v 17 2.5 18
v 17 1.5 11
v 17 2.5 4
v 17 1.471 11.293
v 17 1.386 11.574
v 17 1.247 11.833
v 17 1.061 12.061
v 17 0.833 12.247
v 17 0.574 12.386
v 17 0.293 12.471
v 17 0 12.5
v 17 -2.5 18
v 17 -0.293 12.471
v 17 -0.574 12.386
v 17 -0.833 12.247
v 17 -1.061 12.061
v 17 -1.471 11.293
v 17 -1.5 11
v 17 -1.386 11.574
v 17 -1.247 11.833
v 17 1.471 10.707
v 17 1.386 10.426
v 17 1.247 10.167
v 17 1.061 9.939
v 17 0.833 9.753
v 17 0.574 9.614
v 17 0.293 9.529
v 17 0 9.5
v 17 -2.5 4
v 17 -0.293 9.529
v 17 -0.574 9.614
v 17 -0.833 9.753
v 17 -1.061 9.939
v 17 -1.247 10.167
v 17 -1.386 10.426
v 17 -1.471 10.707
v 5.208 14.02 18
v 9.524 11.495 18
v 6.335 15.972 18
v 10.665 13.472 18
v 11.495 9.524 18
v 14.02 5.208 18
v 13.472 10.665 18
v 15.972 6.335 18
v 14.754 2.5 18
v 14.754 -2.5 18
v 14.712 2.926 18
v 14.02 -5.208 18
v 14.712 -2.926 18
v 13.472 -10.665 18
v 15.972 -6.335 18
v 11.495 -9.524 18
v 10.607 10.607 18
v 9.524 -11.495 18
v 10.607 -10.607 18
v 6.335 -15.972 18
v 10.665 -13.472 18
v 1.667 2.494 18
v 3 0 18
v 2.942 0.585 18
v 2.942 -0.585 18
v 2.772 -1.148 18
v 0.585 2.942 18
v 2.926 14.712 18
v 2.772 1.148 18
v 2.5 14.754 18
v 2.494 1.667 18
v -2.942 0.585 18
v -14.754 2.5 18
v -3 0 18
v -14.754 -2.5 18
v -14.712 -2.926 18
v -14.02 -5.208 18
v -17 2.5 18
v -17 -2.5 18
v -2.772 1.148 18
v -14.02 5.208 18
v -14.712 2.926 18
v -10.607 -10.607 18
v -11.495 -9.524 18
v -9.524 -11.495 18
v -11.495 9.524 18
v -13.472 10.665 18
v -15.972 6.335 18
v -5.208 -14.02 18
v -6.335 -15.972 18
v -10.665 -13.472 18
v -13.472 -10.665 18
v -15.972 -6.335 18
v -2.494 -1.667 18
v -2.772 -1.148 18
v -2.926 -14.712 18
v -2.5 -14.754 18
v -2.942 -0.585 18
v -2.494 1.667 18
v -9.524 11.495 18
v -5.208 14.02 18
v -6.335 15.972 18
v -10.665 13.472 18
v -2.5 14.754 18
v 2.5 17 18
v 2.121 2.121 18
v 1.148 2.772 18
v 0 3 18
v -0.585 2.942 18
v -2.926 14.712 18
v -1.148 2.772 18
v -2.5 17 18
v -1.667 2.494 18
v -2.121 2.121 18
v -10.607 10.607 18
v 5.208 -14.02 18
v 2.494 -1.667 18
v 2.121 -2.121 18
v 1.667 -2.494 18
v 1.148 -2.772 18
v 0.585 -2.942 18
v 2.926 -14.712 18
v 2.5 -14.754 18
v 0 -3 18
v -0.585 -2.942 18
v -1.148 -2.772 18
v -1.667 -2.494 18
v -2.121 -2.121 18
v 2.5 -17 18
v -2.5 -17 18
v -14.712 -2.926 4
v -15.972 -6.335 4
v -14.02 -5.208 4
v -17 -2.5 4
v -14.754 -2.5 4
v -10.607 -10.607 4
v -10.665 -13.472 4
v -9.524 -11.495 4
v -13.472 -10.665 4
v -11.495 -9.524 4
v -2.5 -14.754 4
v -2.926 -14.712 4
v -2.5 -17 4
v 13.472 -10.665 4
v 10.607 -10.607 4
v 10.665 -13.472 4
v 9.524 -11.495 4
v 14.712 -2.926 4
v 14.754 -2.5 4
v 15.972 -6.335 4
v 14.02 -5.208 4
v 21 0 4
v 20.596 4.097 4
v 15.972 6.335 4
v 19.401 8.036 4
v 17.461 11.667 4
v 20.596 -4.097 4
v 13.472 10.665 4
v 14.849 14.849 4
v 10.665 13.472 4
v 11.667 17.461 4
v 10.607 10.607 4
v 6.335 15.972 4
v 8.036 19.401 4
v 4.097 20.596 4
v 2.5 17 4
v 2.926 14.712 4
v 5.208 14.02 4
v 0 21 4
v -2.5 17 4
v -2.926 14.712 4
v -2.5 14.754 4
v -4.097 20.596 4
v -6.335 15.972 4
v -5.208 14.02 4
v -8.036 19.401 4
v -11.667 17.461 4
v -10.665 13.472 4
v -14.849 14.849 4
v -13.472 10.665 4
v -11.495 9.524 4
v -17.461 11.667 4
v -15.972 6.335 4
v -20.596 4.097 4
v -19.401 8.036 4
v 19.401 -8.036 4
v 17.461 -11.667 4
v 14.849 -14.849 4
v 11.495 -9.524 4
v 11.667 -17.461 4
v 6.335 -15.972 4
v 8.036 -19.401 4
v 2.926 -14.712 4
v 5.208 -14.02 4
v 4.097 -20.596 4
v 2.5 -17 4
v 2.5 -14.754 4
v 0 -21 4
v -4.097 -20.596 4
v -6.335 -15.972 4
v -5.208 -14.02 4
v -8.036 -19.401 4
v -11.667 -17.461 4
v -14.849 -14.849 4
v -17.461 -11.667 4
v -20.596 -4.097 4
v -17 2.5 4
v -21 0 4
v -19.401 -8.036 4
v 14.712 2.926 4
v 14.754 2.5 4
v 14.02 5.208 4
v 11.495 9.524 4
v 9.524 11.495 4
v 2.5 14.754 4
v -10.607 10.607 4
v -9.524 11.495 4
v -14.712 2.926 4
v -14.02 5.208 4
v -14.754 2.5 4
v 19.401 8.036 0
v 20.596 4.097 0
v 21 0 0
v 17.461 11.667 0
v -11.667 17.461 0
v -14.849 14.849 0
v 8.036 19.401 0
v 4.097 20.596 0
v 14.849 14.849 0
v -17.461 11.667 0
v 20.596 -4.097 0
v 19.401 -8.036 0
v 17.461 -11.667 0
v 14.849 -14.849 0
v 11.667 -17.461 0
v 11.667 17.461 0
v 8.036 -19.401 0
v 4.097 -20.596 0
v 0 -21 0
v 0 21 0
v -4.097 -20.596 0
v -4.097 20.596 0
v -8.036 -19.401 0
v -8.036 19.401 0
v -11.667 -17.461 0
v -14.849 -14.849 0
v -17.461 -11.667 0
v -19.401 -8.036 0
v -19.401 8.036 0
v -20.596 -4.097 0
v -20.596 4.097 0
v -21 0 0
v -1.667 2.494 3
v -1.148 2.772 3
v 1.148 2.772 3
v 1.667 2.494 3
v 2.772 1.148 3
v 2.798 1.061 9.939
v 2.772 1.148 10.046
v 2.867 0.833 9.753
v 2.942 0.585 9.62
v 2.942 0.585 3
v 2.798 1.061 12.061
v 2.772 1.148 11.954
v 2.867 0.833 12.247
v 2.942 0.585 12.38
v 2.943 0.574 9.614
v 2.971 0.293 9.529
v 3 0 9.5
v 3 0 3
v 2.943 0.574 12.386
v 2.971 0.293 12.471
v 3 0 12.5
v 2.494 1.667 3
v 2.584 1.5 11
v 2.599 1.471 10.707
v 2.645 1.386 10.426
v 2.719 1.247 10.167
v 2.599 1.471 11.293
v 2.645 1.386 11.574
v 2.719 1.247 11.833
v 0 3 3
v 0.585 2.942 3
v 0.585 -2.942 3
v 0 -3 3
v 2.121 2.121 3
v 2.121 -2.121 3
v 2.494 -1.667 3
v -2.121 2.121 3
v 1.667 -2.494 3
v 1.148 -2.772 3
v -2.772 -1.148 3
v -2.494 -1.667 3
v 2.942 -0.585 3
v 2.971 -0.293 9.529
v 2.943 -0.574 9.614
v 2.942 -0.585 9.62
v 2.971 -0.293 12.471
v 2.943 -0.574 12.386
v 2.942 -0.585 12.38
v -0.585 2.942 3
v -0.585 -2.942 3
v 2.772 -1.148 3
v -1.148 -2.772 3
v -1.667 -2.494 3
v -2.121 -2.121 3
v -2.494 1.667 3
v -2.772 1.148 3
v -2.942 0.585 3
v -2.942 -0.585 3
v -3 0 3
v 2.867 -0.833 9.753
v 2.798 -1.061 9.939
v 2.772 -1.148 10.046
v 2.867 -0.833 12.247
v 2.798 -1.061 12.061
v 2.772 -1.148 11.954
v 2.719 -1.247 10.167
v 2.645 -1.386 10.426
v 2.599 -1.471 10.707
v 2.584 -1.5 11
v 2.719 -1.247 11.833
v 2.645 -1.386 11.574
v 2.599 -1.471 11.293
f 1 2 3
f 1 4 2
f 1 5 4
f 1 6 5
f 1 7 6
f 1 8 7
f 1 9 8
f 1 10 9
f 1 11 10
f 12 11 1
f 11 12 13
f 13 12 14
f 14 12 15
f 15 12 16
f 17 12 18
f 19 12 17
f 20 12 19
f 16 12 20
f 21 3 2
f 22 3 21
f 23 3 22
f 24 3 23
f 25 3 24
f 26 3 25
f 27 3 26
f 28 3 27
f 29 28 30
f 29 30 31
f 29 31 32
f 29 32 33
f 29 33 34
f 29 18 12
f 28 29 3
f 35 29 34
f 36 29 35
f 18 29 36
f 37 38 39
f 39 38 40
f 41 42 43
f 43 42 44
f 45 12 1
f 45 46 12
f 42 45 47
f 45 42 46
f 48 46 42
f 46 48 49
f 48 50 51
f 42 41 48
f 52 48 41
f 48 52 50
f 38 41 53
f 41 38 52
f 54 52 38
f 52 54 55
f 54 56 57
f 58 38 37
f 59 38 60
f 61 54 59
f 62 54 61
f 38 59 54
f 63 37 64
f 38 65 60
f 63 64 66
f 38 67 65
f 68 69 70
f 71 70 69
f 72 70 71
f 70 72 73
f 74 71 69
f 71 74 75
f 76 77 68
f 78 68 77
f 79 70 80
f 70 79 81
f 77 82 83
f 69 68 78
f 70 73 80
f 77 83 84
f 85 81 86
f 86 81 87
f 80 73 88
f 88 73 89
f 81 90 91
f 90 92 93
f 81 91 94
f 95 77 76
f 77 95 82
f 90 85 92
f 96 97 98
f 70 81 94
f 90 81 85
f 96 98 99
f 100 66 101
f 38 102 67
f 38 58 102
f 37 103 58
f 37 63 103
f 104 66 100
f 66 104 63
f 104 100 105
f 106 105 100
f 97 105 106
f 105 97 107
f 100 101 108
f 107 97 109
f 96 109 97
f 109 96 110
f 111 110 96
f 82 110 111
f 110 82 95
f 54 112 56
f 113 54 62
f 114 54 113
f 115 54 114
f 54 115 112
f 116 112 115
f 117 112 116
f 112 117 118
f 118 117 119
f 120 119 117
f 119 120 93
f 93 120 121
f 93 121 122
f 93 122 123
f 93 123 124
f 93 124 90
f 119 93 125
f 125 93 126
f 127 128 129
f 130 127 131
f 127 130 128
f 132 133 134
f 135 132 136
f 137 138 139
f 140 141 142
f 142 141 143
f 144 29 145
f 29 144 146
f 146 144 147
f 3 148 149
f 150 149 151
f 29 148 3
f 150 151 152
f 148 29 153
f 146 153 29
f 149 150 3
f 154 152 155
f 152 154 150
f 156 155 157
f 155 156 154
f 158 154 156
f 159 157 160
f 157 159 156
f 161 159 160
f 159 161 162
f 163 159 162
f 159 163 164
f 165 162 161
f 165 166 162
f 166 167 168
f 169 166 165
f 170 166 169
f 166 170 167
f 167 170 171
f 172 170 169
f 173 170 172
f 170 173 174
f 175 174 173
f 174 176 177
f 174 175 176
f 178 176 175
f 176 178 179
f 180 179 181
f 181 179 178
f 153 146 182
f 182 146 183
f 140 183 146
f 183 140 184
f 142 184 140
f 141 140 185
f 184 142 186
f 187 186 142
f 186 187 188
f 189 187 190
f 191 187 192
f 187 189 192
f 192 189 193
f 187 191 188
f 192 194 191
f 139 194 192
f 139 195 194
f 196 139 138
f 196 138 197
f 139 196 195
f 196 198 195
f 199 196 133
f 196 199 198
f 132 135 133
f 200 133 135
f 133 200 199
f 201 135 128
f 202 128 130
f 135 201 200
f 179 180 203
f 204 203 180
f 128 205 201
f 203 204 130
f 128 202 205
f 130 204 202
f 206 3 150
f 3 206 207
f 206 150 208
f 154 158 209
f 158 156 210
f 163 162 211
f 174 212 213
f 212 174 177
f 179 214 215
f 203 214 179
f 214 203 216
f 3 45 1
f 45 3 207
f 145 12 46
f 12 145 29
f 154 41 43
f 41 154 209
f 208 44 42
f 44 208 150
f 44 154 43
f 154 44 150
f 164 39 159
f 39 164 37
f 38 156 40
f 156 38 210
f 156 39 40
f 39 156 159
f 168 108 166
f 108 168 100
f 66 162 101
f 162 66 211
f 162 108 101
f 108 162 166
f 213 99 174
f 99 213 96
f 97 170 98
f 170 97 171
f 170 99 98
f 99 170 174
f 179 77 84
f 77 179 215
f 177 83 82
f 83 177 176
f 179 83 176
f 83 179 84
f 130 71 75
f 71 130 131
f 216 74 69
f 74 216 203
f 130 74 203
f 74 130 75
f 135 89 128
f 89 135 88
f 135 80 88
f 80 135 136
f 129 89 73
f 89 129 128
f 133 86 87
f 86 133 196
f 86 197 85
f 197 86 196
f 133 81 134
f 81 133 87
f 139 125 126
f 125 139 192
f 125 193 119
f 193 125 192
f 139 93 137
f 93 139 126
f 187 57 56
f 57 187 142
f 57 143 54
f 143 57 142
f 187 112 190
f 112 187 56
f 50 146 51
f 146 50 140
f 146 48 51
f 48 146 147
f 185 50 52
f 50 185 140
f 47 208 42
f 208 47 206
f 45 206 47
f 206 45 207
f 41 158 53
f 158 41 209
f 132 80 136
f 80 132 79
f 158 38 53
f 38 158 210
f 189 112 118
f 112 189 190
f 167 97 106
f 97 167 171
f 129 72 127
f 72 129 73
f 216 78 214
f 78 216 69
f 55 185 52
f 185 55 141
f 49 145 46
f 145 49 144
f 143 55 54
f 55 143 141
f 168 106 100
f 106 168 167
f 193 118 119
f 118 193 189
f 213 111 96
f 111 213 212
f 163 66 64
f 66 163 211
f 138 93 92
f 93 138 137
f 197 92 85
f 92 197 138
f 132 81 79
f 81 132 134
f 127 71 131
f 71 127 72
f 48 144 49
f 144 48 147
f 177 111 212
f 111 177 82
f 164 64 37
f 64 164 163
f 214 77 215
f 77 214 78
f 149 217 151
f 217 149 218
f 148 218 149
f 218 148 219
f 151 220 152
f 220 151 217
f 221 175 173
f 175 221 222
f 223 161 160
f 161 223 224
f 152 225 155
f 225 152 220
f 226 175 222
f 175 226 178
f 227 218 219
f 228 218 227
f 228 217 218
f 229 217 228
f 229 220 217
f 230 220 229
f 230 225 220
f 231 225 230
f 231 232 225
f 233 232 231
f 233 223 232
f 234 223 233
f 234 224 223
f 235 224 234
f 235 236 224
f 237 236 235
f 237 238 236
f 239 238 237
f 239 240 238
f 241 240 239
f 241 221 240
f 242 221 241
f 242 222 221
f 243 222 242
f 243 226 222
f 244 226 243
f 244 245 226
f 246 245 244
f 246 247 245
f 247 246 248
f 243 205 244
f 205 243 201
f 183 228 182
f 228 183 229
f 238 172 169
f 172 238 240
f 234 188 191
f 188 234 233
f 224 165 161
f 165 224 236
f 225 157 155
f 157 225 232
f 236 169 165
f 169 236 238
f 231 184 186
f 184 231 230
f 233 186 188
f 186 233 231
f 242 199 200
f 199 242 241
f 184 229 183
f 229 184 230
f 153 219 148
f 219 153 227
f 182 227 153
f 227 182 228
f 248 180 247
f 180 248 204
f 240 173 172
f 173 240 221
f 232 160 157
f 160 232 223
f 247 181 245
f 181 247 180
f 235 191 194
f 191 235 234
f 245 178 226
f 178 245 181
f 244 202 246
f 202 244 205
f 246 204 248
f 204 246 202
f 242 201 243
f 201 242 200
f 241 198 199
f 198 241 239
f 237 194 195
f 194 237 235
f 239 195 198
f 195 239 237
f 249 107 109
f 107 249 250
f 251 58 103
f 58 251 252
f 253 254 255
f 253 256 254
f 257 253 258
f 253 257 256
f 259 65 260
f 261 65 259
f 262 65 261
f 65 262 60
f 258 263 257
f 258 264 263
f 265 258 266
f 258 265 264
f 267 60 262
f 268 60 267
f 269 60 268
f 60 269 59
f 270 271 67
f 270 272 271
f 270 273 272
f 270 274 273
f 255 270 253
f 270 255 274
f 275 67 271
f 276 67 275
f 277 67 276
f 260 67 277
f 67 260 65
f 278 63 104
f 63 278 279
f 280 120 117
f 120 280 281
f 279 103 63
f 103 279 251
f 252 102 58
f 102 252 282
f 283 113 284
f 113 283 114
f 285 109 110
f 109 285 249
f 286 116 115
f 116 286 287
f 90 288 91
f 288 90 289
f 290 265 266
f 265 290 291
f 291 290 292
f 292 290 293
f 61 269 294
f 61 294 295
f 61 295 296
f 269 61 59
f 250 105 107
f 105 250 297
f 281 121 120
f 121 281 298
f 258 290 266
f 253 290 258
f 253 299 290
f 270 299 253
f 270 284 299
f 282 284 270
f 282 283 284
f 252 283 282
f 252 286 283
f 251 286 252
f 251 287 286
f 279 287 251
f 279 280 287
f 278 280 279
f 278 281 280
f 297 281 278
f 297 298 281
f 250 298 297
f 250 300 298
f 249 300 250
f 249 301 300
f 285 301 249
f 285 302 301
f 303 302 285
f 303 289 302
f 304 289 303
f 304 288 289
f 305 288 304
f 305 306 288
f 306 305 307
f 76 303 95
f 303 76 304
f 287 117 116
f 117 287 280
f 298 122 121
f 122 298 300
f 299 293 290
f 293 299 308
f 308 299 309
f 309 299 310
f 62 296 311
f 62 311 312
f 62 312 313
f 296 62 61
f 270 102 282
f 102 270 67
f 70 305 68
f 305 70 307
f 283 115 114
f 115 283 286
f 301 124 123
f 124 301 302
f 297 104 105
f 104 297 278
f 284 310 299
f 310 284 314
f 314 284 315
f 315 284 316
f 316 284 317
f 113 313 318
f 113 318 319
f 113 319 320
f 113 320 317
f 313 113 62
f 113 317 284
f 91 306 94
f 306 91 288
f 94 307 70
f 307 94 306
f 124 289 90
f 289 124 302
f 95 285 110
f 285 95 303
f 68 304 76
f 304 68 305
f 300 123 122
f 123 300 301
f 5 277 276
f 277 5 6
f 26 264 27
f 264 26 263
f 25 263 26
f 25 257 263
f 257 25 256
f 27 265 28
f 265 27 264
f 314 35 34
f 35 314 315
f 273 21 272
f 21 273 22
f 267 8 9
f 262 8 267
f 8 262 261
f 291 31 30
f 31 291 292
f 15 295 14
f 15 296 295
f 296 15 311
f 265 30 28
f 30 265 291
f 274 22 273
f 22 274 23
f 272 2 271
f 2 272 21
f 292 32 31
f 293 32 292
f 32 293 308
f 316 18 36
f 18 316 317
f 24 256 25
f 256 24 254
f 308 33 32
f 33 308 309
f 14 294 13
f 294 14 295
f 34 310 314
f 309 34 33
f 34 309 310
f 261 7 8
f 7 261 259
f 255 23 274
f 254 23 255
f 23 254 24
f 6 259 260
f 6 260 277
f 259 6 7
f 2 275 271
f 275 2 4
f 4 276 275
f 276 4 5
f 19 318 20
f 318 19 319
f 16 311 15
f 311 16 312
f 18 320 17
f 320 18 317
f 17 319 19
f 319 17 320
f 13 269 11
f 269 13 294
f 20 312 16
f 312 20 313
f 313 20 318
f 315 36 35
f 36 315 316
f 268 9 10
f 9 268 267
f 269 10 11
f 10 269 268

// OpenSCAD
$fn = 32;

// ----------------------------------------------------------------------
// Control knob: skirt knob with grip ribs
// ----------------------------------------------------------------------

// --- parameters (mm) ---
skirt_d = 42;             // skirt diameter
skirt_t = 4;              // skirt thickness
rib_w = 5;                // grip rib width
rib_out = 3;              // grip rib radial protrusion
n_ribs = 12;              // number of grip ribs
knob_d = 30;              // knob body diameter
knob_h = 14;              // knob body height
bore_d = 6;               // shaft bore diameter
set_d = 3;                // set screw bore diameter
fit_tol = 0.1;            // tolerance for press fits, mm
free_tol = 0.3;           // tolerance for clearance fits, mm

rib_step = 360 / n_ribs;  // rib angular step
total_h = skirt_t + knob_h;  // overall height

difference() {
  union() {
    translate([0, 0, skirt_t]) cylinder(h = knob_h, d = knob_d);
    cylinder(h = skirt_t, d = skirt_d);
    for (i = [0 : n_ribs - 1])
      rotate([0, 0, i * rib_step])
        translate([knob_d / 2 - 1, -rib_w / 2, skirt_t])
          cube([rib_out, rib_w, knob_h]);
  }
  translate([0, 0, skirt_t - 1]) cylinder(h = knob_h + 2, d = bore_d);
  translate([-1, 0, skirt_t + knob_h / 2]) rotate([0, 90, 0])
    cylinder(h = knob_d / 2 + bore_d / 2 + 2, d = set_d);
}
